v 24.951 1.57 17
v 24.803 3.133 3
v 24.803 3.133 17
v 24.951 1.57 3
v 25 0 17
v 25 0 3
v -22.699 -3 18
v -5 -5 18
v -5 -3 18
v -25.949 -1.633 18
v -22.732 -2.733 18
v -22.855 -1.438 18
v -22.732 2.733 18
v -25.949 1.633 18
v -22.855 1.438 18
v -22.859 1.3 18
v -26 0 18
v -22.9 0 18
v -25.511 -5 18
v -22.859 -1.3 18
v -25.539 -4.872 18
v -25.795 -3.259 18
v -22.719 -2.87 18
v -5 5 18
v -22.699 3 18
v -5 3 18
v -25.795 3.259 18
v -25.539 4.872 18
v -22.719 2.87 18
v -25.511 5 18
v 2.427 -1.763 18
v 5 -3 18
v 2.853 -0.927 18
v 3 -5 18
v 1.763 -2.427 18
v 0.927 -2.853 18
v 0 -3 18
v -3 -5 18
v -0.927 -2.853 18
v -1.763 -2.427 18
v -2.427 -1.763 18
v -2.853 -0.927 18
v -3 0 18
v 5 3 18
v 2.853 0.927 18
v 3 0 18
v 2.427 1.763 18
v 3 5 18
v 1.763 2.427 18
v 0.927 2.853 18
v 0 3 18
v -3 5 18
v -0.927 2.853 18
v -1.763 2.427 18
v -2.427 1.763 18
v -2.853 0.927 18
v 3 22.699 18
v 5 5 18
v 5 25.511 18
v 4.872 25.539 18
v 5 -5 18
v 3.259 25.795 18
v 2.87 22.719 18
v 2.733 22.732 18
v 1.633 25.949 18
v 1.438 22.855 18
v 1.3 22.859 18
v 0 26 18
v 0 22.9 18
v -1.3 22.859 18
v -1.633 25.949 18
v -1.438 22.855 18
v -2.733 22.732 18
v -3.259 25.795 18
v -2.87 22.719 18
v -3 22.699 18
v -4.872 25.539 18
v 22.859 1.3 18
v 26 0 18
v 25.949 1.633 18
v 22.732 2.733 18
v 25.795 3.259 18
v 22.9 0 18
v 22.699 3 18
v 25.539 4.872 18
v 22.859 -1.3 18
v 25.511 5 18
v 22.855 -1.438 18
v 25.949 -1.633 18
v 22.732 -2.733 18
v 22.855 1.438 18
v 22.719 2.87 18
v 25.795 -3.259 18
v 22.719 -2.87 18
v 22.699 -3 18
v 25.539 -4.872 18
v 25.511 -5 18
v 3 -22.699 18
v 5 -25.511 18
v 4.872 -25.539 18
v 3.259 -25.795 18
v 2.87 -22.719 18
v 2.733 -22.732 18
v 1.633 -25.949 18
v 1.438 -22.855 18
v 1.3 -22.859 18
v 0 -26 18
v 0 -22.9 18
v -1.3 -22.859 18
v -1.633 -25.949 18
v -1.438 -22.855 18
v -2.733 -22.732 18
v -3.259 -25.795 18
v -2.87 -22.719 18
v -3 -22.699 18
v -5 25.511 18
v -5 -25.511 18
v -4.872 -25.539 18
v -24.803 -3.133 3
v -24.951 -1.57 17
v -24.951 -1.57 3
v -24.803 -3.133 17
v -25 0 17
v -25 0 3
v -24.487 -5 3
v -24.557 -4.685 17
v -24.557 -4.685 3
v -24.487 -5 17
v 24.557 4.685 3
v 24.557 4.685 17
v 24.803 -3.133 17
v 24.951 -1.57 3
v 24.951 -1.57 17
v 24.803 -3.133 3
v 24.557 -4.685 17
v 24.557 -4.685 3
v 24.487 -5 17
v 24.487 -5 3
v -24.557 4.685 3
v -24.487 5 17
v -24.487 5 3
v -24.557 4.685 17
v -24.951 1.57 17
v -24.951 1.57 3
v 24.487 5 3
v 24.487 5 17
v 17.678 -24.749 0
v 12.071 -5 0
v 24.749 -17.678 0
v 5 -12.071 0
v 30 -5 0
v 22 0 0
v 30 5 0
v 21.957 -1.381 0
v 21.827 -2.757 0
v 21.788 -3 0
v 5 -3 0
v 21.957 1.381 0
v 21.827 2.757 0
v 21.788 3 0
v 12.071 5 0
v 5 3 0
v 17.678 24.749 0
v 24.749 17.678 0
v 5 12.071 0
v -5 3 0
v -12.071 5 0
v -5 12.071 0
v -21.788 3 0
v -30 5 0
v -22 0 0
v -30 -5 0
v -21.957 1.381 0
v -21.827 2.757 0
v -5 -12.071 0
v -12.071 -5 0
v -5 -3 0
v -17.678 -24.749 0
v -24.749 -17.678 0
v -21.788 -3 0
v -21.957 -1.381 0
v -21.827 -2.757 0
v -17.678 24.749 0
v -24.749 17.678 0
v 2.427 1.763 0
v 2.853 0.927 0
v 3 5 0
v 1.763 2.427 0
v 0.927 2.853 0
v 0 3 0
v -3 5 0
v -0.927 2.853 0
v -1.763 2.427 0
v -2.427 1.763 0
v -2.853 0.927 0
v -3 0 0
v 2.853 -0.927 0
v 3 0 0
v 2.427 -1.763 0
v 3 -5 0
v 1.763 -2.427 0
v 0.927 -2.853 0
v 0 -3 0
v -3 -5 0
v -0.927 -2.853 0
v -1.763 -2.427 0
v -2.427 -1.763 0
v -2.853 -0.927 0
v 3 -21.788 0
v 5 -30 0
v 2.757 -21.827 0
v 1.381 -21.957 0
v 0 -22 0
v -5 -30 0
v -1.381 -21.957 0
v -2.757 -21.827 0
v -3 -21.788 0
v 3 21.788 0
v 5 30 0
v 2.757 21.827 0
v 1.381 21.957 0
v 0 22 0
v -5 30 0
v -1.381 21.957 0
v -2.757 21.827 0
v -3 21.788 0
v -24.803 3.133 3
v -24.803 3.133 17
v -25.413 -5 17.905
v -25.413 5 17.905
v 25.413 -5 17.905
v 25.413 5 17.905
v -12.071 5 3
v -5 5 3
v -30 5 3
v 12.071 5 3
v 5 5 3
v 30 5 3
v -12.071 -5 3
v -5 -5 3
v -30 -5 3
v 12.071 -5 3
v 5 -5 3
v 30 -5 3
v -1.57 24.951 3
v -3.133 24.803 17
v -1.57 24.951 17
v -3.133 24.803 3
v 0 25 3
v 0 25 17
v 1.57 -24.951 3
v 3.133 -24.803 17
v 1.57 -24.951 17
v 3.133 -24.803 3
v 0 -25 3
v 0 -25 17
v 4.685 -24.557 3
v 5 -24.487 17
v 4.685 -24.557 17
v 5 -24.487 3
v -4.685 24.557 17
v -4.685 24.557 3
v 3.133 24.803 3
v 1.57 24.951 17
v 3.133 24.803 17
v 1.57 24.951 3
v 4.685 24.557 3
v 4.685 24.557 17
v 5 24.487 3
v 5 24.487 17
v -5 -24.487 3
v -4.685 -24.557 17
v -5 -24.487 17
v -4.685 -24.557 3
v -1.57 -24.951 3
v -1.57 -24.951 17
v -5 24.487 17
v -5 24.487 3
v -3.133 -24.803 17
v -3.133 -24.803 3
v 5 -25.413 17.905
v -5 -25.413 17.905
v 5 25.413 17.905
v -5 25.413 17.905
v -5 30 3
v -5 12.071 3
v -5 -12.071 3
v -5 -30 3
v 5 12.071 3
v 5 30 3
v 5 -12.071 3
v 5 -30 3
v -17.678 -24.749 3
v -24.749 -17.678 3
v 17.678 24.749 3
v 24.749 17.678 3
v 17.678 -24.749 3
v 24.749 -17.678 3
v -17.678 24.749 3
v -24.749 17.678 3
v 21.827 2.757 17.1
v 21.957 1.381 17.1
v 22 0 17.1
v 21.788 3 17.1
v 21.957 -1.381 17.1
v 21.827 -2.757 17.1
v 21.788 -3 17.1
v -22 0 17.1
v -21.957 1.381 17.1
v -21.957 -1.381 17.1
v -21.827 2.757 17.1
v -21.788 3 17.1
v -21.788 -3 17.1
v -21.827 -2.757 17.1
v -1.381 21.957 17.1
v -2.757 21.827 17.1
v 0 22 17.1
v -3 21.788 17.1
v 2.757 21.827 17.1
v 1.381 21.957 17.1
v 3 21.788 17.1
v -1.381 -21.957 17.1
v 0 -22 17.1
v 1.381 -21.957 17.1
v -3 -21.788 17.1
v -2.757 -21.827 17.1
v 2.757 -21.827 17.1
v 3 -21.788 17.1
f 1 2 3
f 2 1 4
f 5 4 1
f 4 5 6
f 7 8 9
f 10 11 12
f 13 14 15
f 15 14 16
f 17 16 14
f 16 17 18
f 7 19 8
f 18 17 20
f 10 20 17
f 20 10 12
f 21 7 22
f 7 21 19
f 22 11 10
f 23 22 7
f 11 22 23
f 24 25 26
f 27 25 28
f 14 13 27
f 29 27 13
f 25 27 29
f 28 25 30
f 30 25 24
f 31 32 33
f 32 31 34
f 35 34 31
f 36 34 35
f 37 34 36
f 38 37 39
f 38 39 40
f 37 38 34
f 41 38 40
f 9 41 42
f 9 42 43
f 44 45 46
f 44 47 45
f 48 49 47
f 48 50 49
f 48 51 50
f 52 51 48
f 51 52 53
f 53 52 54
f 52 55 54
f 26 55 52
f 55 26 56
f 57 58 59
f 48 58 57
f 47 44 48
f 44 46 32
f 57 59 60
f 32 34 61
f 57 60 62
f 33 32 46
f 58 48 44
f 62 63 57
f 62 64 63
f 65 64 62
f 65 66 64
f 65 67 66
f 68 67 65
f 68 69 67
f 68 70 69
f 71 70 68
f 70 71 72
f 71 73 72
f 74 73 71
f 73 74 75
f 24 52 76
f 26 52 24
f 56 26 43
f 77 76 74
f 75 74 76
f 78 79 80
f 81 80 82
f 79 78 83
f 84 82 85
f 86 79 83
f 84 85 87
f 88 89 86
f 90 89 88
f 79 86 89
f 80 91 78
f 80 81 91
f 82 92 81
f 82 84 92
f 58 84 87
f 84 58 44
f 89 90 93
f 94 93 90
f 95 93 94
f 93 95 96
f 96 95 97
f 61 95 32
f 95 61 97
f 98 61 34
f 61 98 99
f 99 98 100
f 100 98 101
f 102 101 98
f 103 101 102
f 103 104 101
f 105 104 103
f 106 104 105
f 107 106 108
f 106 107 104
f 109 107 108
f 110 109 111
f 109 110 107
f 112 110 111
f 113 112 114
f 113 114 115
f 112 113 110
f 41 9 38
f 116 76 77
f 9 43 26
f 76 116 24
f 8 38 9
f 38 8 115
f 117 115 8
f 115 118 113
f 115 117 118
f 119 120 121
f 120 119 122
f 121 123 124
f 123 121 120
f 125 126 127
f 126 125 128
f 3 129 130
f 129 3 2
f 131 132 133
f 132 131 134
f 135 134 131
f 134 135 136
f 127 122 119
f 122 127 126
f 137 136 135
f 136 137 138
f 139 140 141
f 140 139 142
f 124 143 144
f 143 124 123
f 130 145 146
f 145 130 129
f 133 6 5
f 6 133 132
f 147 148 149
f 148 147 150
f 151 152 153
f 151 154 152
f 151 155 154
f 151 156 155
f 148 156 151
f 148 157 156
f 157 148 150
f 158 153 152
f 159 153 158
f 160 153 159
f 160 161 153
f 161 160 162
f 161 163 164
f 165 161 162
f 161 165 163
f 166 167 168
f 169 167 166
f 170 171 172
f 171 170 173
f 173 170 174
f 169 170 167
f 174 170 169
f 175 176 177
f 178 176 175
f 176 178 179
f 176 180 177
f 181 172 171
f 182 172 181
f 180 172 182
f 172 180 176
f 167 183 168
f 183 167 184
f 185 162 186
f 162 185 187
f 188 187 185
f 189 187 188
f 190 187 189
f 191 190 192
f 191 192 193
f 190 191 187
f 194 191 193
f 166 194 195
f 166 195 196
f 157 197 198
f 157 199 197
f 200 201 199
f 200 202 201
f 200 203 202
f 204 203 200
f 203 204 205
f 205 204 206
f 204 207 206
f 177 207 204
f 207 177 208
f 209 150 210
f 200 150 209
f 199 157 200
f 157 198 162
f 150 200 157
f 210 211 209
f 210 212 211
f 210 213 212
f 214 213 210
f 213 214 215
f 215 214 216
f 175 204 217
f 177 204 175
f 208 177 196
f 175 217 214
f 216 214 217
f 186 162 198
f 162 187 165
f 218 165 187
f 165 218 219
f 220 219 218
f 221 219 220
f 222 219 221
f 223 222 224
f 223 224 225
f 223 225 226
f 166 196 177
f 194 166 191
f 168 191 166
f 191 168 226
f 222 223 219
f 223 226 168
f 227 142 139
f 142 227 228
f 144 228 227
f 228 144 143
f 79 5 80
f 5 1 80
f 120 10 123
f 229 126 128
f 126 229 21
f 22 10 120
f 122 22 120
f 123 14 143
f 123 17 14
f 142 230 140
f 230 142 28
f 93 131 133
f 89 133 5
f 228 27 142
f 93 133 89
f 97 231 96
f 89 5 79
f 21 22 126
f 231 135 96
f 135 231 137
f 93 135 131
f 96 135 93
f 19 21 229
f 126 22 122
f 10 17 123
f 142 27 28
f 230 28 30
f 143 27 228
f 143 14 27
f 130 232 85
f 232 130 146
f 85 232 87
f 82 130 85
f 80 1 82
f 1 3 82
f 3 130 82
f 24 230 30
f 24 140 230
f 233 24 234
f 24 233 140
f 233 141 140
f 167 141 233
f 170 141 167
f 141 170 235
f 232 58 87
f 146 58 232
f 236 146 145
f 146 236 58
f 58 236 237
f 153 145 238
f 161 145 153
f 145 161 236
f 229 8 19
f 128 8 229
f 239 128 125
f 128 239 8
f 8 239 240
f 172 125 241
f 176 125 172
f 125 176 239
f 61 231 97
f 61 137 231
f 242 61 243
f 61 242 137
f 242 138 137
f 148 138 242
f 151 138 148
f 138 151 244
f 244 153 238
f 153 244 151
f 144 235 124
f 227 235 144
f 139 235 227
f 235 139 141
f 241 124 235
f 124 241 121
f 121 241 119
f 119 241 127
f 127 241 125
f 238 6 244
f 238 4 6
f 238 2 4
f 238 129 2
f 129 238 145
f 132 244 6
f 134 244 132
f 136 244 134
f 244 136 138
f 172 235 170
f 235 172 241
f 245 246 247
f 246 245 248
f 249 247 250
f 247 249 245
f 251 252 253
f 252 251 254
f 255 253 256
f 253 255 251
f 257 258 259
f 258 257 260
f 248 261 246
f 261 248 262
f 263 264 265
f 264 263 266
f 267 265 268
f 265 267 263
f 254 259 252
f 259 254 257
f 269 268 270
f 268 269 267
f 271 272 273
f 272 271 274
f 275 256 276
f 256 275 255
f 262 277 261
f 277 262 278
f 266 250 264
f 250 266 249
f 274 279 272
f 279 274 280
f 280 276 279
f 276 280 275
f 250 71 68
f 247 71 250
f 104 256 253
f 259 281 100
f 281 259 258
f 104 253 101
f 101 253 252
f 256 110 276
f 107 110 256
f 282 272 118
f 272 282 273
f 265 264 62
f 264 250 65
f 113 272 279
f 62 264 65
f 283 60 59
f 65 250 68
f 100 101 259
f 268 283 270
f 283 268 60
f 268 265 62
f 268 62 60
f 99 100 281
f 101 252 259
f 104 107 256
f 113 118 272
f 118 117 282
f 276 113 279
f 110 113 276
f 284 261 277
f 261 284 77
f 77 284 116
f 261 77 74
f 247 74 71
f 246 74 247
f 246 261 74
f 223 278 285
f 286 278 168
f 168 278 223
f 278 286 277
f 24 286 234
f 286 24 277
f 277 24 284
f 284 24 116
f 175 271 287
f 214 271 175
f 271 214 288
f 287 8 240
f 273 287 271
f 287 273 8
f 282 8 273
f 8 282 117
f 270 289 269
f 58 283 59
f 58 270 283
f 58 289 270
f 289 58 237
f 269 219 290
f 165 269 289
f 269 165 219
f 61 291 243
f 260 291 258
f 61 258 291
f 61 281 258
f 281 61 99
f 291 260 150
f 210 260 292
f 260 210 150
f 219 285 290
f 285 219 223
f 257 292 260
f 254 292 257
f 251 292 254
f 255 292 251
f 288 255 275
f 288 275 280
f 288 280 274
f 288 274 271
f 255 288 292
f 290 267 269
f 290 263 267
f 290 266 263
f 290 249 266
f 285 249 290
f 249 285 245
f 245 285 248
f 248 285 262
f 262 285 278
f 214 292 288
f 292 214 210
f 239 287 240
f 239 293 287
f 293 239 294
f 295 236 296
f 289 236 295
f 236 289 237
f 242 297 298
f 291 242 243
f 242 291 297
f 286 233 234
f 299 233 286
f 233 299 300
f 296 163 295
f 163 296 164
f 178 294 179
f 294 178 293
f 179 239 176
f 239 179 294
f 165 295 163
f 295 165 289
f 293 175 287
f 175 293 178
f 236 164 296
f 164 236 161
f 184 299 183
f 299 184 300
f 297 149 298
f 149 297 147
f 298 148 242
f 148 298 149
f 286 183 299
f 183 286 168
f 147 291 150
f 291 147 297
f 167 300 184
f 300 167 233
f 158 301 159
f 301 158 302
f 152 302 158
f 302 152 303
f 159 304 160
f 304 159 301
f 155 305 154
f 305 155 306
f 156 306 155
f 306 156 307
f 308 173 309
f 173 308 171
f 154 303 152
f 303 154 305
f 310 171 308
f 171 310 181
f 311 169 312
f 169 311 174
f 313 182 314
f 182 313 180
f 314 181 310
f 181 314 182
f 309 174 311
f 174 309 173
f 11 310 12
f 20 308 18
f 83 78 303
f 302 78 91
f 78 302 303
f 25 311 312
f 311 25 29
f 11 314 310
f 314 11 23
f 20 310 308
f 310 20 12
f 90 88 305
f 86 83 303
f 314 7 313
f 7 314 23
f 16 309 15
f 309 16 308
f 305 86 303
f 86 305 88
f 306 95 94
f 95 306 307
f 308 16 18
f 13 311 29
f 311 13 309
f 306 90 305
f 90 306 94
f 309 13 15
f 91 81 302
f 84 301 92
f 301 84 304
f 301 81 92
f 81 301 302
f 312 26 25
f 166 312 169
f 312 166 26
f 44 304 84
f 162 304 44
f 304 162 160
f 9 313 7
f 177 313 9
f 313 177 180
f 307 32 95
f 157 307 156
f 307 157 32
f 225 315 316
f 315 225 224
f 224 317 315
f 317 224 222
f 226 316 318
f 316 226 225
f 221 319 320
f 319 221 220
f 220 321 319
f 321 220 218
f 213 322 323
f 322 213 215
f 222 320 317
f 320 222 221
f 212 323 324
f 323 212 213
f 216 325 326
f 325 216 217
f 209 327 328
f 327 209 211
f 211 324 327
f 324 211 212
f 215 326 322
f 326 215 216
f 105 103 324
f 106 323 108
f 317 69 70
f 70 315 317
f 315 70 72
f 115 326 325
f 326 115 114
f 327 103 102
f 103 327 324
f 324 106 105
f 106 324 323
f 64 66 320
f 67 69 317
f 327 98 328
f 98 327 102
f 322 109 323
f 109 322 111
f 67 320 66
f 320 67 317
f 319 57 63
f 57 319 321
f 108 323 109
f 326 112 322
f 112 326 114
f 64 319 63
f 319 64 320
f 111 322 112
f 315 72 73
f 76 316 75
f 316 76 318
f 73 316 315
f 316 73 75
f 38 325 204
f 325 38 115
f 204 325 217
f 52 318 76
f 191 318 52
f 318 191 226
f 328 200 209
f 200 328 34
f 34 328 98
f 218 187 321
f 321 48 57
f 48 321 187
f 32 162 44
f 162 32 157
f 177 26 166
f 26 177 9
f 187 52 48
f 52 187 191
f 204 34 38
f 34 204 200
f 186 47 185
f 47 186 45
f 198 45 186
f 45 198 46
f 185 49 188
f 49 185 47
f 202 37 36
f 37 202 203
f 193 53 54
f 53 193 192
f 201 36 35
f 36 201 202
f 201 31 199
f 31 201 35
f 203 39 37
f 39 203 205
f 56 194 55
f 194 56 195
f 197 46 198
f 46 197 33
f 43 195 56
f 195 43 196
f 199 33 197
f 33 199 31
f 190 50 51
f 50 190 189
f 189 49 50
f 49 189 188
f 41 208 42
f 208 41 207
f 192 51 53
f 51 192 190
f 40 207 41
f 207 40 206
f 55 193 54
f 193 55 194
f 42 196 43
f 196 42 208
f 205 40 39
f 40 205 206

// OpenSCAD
//
// Parametric spool bracket
//
// by Egil Kvaleberg
//
// Some spool types (measurements are approximate):
//
//   Standard 1kg plastic: 52 mm
//   Medium 1kg plastic: 38 mm
//   Small plastic 19.5 mm
//   Large 1kg paper/metal: 58 mm
//   Small 1kg plstic: 32 mm
//   Paper/plastic 1kg centre: 30.5 inset by 25, outer 72 mm
//
//*****************************************************************************
// Adjustables

// The spool center hole diameter
spool = 52.0;   // in mm

// Axle diameter	
axle_d = 6.0;	   // in mm   

// Arm height
arm_h = 18.0;    // in mm     

wall = 1*2.0;     // wall thickness

flange = 1*4;
flange_h = 1*3;		

ridge = 1*1.0;    // at end of arms

arm_w = axle_d + 2*wall;   // arm_width (can be set to other values)

fudge = 1*0.1; 

//*****************************************************************************
// View and printing

view(); 

module rounded_cube(d, y, z) 
{
	cyl_r = d/2 - ridge;
	intersection ( ){
		union () {
			cylinder(r = cyl_r, h = z, $fn=100);
			translate([0, 0, z-ridge]) cylinder(r1 = cyl_r, r2 = cyl_r+ridge, h=ridge, $fn=100);
		}
		translate([-d/2, -y/2, 0]) cube([d, y, z]);
	}
}

module add_flange(do)
{
	x = (do) ? spool+2*flange : 0;
	translate([-x/2, -arm_w/2, 0]) cube([x, arm_w, flange_h]);	
}

module add_arm()
{
	union () {
		rounded_cube(spool, arm_w, arm_h);	
		add_flange(true);
	}
}

module sub_arm()
{
	translate([0, 0, -fudge]) rounded_cube((spool-2*ridge)-2*wall, arm_w-2*wall, arm_h+2*fudge);	
}

module view()
{
	union () {
		difference () {
			union () {
				add_arm();
				rotate ([0, 0, 90]) add_arm();
				rotate ([0, 0, 45]) add_flange(spool > 6*axle_d); // only add flange if it makes sense
				rotate ([0, 0, 135]) add_flange(spool > 6*axle_d);
			}
			union () {
				sub_arm();
				rotate ([0, 0, 90]) sub_arm();
				translate([0, 0, -fudge])  cylinder(r = axle_d/2, h = arm_h+2*fudge, $fn=20); // centre hole
			}
		}
		difference ( ){
			translate([-arm_w/2, -arm_w/2, 0]) cube([arm_w, arm_w, arm_h]); // centre	piece
			translate([0, 0, -fudge])  cylinder(r = axle_d/2, h = arm_h+2*fudge, $fn=20); // axle hole
		}
	}
}


//*****************************************************************************
